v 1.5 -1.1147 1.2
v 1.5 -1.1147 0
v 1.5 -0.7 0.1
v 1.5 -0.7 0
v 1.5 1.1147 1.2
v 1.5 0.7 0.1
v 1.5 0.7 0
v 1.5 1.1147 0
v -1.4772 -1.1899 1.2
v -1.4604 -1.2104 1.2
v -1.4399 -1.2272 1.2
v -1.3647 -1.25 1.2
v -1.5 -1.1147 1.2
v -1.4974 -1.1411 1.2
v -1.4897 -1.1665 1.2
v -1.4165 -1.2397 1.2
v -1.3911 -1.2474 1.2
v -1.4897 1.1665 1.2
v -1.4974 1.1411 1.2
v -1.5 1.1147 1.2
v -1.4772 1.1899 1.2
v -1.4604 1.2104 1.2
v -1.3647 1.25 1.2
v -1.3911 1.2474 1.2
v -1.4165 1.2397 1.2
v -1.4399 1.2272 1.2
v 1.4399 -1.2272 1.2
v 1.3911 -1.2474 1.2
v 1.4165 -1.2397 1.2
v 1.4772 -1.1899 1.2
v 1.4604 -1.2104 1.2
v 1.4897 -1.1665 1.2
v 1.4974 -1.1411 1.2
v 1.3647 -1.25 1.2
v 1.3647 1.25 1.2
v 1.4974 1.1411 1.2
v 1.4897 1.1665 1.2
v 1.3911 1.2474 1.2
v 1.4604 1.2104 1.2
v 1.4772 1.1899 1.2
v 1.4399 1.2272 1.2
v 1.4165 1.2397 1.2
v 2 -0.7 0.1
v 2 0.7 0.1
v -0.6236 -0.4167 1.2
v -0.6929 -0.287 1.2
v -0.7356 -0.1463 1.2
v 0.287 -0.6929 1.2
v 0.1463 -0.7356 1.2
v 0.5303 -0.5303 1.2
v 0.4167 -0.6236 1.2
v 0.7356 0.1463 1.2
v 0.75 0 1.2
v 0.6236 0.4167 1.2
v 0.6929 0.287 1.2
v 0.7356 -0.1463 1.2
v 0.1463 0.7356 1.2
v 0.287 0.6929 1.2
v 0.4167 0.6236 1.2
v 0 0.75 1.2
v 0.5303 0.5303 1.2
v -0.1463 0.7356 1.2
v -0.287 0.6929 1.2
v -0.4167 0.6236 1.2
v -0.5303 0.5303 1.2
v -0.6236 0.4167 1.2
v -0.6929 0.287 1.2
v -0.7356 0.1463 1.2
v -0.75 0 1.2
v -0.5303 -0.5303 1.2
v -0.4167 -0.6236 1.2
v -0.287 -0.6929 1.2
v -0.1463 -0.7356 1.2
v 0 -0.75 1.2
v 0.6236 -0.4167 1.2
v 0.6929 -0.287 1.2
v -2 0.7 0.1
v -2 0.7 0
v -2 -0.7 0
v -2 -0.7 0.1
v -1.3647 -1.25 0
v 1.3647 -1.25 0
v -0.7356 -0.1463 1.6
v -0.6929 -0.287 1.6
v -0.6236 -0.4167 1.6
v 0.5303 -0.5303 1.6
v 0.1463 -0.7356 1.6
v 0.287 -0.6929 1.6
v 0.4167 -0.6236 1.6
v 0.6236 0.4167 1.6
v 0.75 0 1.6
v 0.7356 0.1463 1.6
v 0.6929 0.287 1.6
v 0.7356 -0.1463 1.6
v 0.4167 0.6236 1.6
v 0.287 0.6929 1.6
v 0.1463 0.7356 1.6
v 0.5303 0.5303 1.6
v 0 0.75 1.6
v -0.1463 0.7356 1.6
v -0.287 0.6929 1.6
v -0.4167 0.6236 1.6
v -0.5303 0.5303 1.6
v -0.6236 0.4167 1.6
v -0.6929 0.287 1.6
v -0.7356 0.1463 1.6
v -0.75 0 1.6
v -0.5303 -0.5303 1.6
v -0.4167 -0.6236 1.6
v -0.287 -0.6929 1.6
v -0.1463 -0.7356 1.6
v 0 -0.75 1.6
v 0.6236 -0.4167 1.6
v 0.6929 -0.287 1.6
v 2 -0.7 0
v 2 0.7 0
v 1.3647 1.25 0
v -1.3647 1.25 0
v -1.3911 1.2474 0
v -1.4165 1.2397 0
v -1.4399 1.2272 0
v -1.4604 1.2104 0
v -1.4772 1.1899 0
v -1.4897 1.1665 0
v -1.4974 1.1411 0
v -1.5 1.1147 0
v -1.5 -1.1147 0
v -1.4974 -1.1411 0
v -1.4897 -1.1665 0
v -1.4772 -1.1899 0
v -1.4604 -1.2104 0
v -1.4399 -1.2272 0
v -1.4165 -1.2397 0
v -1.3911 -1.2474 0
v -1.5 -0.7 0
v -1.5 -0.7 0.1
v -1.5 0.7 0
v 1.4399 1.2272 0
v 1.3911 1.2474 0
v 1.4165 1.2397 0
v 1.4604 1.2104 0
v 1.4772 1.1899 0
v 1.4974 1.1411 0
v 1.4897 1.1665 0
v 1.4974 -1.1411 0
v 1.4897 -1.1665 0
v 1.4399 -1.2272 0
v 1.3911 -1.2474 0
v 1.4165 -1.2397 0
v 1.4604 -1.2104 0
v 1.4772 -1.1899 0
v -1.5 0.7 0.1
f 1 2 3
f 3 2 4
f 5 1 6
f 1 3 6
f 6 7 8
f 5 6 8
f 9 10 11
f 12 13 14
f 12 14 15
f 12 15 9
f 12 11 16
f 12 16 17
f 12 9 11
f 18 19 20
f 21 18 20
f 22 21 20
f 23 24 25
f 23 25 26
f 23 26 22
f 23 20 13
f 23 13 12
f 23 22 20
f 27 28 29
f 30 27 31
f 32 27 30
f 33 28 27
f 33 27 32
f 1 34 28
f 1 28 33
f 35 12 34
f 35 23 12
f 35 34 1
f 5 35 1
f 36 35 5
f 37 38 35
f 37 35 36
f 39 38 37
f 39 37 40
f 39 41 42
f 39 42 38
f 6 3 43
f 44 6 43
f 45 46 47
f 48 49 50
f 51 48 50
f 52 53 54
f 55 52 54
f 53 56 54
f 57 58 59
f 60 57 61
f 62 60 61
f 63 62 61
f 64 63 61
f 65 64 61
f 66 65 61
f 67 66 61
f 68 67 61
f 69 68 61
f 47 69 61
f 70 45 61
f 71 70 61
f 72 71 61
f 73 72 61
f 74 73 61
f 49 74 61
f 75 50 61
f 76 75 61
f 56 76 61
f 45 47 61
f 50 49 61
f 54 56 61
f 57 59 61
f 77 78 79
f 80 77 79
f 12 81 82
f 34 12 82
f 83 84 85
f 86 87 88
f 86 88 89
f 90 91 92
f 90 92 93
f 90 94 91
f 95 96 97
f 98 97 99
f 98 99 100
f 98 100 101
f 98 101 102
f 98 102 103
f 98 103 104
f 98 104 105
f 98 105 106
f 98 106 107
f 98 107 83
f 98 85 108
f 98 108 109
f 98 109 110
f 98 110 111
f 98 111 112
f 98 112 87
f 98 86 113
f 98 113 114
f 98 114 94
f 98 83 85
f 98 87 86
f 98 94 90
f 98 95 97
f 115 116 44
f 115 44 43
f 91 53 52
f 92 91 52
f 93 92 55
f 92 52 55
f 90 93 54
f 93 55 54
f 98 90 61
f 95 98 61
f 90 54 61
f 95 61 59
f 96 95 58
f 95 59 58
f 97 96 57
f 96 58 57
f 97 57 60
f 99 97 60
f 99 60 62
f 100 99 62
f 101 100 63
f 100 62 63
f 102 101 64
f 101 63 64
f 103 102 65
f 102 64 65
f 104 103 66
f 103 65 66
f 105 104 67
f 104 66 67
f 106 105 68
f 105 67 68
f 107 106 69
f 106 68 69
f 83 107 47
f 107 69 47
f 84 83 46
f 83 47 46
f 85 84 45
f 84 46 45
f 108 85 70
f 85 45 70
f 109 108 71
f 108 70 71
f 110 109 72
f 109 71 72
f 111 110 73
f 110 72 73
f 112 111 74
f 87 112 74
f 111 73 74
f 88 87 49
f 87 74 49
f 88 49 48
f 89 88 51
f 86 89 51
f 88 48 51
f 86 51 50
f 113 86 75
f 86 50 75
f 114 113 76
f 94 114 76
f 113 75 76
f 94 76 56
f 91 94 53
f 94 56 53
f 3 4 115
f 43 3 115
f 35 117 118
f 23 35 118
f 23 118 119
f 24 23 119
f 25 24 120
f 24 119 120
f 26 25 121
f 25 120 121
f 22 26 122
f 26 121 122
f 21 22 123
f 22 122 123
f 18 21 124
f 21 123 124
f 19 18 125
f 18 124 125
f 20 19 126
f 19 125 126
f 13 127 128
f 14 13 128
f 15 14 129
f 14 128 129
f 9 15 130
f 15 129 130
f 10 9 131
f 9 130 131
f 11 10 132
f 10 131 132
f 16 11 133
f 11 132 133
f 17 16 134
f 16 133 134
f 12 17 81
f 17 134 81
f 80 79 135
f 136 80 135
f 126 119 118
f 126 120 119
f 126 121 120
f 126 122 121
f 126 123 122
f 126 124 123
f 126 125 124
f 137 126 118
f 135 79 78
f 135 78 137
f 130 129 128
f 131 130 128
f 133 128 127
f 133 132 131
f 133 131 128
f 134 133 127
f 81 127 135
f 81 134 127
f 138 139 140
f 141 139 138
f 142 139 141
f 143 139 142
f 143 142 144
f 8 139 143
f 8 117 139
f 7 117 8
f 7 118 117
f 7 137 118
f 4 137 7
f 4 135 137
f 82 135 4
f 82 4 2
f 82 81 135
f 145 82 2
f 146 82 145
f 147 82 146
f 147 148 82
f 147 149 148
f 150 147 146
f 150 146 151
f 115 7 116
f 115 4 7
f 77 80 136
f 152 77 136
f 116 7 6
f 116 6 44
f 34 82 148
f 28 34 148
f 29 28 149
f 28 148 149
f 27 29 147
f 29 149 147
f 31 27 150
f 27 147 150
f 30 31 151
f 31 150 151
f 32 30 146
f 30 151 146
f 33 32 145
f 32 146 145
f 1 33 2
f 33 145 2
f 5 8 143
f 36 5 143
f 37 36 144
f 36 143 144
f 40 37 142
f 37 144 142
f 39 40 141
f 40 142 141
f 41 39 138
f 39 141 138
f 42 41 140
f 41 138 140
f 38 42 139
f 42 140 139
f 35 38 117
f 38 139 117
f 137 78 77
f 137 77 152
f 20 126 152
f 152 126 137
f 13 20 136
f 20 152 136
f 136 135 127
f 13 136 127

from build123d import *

# Parameters (mm, degrees)
F1_DEPTH = 1.2
F2_R     = 0.75
F3_DEPTH = 0.4
F4_W     = 4
F4_H     = 1.4
F5_DEPTH = 0.1


with BuildPart() as f1:
    # F0 (on Top) → F1 (new body)
    with BuildSketch(Plane.XY):
        with BuildLine():
            Line((-1.364697, -1.25), (1.364697, -1.25))
            ThreePointArc((1.364697, -1.25), (1.460371, -1.210371), (1.5, -1.114697))
            Line((1.5, -1.114697), (1.5, 1.114697))
            ThreePointArc((1.5, 1.114697), (1.460371, 1.210371), (1.364697, 1.25))
            Line((1.364697, 1.25), (-1.364697, 1.25))
            ThreePointArc((-1.364697, 1.25), (-1.460371, 1.210371), (-1.5, 1.114697))
            Line((-1.5, 1.114697), (-1.5, -1.114697))
            ThreePointArc((-1.5, -1.114697), (-1.460371, -1.210371), (-1.364697, -1.25))
        make_face()
    extrude(amount=F1_DEPTH)

    # F4 (on face) → F5 (join)
    with BuildSketch(Plane(origin=(0, 0, 0), x_dir=(1, 0, 0), z_dir=(0, 0, -1))):
        Rectangle(F4_W, F4_H)
    extrude(amount=-F5_DEPTH)


with BuildPart() as f3:
    # F2 (on face) → F3 (new body)
    with BuildSketch(Plane.XY.offset(1.2)):
        Circle(F2_R)
    extrude(amount=F3_DEPTH)


solid = Compound([f1.part, f3.part])
